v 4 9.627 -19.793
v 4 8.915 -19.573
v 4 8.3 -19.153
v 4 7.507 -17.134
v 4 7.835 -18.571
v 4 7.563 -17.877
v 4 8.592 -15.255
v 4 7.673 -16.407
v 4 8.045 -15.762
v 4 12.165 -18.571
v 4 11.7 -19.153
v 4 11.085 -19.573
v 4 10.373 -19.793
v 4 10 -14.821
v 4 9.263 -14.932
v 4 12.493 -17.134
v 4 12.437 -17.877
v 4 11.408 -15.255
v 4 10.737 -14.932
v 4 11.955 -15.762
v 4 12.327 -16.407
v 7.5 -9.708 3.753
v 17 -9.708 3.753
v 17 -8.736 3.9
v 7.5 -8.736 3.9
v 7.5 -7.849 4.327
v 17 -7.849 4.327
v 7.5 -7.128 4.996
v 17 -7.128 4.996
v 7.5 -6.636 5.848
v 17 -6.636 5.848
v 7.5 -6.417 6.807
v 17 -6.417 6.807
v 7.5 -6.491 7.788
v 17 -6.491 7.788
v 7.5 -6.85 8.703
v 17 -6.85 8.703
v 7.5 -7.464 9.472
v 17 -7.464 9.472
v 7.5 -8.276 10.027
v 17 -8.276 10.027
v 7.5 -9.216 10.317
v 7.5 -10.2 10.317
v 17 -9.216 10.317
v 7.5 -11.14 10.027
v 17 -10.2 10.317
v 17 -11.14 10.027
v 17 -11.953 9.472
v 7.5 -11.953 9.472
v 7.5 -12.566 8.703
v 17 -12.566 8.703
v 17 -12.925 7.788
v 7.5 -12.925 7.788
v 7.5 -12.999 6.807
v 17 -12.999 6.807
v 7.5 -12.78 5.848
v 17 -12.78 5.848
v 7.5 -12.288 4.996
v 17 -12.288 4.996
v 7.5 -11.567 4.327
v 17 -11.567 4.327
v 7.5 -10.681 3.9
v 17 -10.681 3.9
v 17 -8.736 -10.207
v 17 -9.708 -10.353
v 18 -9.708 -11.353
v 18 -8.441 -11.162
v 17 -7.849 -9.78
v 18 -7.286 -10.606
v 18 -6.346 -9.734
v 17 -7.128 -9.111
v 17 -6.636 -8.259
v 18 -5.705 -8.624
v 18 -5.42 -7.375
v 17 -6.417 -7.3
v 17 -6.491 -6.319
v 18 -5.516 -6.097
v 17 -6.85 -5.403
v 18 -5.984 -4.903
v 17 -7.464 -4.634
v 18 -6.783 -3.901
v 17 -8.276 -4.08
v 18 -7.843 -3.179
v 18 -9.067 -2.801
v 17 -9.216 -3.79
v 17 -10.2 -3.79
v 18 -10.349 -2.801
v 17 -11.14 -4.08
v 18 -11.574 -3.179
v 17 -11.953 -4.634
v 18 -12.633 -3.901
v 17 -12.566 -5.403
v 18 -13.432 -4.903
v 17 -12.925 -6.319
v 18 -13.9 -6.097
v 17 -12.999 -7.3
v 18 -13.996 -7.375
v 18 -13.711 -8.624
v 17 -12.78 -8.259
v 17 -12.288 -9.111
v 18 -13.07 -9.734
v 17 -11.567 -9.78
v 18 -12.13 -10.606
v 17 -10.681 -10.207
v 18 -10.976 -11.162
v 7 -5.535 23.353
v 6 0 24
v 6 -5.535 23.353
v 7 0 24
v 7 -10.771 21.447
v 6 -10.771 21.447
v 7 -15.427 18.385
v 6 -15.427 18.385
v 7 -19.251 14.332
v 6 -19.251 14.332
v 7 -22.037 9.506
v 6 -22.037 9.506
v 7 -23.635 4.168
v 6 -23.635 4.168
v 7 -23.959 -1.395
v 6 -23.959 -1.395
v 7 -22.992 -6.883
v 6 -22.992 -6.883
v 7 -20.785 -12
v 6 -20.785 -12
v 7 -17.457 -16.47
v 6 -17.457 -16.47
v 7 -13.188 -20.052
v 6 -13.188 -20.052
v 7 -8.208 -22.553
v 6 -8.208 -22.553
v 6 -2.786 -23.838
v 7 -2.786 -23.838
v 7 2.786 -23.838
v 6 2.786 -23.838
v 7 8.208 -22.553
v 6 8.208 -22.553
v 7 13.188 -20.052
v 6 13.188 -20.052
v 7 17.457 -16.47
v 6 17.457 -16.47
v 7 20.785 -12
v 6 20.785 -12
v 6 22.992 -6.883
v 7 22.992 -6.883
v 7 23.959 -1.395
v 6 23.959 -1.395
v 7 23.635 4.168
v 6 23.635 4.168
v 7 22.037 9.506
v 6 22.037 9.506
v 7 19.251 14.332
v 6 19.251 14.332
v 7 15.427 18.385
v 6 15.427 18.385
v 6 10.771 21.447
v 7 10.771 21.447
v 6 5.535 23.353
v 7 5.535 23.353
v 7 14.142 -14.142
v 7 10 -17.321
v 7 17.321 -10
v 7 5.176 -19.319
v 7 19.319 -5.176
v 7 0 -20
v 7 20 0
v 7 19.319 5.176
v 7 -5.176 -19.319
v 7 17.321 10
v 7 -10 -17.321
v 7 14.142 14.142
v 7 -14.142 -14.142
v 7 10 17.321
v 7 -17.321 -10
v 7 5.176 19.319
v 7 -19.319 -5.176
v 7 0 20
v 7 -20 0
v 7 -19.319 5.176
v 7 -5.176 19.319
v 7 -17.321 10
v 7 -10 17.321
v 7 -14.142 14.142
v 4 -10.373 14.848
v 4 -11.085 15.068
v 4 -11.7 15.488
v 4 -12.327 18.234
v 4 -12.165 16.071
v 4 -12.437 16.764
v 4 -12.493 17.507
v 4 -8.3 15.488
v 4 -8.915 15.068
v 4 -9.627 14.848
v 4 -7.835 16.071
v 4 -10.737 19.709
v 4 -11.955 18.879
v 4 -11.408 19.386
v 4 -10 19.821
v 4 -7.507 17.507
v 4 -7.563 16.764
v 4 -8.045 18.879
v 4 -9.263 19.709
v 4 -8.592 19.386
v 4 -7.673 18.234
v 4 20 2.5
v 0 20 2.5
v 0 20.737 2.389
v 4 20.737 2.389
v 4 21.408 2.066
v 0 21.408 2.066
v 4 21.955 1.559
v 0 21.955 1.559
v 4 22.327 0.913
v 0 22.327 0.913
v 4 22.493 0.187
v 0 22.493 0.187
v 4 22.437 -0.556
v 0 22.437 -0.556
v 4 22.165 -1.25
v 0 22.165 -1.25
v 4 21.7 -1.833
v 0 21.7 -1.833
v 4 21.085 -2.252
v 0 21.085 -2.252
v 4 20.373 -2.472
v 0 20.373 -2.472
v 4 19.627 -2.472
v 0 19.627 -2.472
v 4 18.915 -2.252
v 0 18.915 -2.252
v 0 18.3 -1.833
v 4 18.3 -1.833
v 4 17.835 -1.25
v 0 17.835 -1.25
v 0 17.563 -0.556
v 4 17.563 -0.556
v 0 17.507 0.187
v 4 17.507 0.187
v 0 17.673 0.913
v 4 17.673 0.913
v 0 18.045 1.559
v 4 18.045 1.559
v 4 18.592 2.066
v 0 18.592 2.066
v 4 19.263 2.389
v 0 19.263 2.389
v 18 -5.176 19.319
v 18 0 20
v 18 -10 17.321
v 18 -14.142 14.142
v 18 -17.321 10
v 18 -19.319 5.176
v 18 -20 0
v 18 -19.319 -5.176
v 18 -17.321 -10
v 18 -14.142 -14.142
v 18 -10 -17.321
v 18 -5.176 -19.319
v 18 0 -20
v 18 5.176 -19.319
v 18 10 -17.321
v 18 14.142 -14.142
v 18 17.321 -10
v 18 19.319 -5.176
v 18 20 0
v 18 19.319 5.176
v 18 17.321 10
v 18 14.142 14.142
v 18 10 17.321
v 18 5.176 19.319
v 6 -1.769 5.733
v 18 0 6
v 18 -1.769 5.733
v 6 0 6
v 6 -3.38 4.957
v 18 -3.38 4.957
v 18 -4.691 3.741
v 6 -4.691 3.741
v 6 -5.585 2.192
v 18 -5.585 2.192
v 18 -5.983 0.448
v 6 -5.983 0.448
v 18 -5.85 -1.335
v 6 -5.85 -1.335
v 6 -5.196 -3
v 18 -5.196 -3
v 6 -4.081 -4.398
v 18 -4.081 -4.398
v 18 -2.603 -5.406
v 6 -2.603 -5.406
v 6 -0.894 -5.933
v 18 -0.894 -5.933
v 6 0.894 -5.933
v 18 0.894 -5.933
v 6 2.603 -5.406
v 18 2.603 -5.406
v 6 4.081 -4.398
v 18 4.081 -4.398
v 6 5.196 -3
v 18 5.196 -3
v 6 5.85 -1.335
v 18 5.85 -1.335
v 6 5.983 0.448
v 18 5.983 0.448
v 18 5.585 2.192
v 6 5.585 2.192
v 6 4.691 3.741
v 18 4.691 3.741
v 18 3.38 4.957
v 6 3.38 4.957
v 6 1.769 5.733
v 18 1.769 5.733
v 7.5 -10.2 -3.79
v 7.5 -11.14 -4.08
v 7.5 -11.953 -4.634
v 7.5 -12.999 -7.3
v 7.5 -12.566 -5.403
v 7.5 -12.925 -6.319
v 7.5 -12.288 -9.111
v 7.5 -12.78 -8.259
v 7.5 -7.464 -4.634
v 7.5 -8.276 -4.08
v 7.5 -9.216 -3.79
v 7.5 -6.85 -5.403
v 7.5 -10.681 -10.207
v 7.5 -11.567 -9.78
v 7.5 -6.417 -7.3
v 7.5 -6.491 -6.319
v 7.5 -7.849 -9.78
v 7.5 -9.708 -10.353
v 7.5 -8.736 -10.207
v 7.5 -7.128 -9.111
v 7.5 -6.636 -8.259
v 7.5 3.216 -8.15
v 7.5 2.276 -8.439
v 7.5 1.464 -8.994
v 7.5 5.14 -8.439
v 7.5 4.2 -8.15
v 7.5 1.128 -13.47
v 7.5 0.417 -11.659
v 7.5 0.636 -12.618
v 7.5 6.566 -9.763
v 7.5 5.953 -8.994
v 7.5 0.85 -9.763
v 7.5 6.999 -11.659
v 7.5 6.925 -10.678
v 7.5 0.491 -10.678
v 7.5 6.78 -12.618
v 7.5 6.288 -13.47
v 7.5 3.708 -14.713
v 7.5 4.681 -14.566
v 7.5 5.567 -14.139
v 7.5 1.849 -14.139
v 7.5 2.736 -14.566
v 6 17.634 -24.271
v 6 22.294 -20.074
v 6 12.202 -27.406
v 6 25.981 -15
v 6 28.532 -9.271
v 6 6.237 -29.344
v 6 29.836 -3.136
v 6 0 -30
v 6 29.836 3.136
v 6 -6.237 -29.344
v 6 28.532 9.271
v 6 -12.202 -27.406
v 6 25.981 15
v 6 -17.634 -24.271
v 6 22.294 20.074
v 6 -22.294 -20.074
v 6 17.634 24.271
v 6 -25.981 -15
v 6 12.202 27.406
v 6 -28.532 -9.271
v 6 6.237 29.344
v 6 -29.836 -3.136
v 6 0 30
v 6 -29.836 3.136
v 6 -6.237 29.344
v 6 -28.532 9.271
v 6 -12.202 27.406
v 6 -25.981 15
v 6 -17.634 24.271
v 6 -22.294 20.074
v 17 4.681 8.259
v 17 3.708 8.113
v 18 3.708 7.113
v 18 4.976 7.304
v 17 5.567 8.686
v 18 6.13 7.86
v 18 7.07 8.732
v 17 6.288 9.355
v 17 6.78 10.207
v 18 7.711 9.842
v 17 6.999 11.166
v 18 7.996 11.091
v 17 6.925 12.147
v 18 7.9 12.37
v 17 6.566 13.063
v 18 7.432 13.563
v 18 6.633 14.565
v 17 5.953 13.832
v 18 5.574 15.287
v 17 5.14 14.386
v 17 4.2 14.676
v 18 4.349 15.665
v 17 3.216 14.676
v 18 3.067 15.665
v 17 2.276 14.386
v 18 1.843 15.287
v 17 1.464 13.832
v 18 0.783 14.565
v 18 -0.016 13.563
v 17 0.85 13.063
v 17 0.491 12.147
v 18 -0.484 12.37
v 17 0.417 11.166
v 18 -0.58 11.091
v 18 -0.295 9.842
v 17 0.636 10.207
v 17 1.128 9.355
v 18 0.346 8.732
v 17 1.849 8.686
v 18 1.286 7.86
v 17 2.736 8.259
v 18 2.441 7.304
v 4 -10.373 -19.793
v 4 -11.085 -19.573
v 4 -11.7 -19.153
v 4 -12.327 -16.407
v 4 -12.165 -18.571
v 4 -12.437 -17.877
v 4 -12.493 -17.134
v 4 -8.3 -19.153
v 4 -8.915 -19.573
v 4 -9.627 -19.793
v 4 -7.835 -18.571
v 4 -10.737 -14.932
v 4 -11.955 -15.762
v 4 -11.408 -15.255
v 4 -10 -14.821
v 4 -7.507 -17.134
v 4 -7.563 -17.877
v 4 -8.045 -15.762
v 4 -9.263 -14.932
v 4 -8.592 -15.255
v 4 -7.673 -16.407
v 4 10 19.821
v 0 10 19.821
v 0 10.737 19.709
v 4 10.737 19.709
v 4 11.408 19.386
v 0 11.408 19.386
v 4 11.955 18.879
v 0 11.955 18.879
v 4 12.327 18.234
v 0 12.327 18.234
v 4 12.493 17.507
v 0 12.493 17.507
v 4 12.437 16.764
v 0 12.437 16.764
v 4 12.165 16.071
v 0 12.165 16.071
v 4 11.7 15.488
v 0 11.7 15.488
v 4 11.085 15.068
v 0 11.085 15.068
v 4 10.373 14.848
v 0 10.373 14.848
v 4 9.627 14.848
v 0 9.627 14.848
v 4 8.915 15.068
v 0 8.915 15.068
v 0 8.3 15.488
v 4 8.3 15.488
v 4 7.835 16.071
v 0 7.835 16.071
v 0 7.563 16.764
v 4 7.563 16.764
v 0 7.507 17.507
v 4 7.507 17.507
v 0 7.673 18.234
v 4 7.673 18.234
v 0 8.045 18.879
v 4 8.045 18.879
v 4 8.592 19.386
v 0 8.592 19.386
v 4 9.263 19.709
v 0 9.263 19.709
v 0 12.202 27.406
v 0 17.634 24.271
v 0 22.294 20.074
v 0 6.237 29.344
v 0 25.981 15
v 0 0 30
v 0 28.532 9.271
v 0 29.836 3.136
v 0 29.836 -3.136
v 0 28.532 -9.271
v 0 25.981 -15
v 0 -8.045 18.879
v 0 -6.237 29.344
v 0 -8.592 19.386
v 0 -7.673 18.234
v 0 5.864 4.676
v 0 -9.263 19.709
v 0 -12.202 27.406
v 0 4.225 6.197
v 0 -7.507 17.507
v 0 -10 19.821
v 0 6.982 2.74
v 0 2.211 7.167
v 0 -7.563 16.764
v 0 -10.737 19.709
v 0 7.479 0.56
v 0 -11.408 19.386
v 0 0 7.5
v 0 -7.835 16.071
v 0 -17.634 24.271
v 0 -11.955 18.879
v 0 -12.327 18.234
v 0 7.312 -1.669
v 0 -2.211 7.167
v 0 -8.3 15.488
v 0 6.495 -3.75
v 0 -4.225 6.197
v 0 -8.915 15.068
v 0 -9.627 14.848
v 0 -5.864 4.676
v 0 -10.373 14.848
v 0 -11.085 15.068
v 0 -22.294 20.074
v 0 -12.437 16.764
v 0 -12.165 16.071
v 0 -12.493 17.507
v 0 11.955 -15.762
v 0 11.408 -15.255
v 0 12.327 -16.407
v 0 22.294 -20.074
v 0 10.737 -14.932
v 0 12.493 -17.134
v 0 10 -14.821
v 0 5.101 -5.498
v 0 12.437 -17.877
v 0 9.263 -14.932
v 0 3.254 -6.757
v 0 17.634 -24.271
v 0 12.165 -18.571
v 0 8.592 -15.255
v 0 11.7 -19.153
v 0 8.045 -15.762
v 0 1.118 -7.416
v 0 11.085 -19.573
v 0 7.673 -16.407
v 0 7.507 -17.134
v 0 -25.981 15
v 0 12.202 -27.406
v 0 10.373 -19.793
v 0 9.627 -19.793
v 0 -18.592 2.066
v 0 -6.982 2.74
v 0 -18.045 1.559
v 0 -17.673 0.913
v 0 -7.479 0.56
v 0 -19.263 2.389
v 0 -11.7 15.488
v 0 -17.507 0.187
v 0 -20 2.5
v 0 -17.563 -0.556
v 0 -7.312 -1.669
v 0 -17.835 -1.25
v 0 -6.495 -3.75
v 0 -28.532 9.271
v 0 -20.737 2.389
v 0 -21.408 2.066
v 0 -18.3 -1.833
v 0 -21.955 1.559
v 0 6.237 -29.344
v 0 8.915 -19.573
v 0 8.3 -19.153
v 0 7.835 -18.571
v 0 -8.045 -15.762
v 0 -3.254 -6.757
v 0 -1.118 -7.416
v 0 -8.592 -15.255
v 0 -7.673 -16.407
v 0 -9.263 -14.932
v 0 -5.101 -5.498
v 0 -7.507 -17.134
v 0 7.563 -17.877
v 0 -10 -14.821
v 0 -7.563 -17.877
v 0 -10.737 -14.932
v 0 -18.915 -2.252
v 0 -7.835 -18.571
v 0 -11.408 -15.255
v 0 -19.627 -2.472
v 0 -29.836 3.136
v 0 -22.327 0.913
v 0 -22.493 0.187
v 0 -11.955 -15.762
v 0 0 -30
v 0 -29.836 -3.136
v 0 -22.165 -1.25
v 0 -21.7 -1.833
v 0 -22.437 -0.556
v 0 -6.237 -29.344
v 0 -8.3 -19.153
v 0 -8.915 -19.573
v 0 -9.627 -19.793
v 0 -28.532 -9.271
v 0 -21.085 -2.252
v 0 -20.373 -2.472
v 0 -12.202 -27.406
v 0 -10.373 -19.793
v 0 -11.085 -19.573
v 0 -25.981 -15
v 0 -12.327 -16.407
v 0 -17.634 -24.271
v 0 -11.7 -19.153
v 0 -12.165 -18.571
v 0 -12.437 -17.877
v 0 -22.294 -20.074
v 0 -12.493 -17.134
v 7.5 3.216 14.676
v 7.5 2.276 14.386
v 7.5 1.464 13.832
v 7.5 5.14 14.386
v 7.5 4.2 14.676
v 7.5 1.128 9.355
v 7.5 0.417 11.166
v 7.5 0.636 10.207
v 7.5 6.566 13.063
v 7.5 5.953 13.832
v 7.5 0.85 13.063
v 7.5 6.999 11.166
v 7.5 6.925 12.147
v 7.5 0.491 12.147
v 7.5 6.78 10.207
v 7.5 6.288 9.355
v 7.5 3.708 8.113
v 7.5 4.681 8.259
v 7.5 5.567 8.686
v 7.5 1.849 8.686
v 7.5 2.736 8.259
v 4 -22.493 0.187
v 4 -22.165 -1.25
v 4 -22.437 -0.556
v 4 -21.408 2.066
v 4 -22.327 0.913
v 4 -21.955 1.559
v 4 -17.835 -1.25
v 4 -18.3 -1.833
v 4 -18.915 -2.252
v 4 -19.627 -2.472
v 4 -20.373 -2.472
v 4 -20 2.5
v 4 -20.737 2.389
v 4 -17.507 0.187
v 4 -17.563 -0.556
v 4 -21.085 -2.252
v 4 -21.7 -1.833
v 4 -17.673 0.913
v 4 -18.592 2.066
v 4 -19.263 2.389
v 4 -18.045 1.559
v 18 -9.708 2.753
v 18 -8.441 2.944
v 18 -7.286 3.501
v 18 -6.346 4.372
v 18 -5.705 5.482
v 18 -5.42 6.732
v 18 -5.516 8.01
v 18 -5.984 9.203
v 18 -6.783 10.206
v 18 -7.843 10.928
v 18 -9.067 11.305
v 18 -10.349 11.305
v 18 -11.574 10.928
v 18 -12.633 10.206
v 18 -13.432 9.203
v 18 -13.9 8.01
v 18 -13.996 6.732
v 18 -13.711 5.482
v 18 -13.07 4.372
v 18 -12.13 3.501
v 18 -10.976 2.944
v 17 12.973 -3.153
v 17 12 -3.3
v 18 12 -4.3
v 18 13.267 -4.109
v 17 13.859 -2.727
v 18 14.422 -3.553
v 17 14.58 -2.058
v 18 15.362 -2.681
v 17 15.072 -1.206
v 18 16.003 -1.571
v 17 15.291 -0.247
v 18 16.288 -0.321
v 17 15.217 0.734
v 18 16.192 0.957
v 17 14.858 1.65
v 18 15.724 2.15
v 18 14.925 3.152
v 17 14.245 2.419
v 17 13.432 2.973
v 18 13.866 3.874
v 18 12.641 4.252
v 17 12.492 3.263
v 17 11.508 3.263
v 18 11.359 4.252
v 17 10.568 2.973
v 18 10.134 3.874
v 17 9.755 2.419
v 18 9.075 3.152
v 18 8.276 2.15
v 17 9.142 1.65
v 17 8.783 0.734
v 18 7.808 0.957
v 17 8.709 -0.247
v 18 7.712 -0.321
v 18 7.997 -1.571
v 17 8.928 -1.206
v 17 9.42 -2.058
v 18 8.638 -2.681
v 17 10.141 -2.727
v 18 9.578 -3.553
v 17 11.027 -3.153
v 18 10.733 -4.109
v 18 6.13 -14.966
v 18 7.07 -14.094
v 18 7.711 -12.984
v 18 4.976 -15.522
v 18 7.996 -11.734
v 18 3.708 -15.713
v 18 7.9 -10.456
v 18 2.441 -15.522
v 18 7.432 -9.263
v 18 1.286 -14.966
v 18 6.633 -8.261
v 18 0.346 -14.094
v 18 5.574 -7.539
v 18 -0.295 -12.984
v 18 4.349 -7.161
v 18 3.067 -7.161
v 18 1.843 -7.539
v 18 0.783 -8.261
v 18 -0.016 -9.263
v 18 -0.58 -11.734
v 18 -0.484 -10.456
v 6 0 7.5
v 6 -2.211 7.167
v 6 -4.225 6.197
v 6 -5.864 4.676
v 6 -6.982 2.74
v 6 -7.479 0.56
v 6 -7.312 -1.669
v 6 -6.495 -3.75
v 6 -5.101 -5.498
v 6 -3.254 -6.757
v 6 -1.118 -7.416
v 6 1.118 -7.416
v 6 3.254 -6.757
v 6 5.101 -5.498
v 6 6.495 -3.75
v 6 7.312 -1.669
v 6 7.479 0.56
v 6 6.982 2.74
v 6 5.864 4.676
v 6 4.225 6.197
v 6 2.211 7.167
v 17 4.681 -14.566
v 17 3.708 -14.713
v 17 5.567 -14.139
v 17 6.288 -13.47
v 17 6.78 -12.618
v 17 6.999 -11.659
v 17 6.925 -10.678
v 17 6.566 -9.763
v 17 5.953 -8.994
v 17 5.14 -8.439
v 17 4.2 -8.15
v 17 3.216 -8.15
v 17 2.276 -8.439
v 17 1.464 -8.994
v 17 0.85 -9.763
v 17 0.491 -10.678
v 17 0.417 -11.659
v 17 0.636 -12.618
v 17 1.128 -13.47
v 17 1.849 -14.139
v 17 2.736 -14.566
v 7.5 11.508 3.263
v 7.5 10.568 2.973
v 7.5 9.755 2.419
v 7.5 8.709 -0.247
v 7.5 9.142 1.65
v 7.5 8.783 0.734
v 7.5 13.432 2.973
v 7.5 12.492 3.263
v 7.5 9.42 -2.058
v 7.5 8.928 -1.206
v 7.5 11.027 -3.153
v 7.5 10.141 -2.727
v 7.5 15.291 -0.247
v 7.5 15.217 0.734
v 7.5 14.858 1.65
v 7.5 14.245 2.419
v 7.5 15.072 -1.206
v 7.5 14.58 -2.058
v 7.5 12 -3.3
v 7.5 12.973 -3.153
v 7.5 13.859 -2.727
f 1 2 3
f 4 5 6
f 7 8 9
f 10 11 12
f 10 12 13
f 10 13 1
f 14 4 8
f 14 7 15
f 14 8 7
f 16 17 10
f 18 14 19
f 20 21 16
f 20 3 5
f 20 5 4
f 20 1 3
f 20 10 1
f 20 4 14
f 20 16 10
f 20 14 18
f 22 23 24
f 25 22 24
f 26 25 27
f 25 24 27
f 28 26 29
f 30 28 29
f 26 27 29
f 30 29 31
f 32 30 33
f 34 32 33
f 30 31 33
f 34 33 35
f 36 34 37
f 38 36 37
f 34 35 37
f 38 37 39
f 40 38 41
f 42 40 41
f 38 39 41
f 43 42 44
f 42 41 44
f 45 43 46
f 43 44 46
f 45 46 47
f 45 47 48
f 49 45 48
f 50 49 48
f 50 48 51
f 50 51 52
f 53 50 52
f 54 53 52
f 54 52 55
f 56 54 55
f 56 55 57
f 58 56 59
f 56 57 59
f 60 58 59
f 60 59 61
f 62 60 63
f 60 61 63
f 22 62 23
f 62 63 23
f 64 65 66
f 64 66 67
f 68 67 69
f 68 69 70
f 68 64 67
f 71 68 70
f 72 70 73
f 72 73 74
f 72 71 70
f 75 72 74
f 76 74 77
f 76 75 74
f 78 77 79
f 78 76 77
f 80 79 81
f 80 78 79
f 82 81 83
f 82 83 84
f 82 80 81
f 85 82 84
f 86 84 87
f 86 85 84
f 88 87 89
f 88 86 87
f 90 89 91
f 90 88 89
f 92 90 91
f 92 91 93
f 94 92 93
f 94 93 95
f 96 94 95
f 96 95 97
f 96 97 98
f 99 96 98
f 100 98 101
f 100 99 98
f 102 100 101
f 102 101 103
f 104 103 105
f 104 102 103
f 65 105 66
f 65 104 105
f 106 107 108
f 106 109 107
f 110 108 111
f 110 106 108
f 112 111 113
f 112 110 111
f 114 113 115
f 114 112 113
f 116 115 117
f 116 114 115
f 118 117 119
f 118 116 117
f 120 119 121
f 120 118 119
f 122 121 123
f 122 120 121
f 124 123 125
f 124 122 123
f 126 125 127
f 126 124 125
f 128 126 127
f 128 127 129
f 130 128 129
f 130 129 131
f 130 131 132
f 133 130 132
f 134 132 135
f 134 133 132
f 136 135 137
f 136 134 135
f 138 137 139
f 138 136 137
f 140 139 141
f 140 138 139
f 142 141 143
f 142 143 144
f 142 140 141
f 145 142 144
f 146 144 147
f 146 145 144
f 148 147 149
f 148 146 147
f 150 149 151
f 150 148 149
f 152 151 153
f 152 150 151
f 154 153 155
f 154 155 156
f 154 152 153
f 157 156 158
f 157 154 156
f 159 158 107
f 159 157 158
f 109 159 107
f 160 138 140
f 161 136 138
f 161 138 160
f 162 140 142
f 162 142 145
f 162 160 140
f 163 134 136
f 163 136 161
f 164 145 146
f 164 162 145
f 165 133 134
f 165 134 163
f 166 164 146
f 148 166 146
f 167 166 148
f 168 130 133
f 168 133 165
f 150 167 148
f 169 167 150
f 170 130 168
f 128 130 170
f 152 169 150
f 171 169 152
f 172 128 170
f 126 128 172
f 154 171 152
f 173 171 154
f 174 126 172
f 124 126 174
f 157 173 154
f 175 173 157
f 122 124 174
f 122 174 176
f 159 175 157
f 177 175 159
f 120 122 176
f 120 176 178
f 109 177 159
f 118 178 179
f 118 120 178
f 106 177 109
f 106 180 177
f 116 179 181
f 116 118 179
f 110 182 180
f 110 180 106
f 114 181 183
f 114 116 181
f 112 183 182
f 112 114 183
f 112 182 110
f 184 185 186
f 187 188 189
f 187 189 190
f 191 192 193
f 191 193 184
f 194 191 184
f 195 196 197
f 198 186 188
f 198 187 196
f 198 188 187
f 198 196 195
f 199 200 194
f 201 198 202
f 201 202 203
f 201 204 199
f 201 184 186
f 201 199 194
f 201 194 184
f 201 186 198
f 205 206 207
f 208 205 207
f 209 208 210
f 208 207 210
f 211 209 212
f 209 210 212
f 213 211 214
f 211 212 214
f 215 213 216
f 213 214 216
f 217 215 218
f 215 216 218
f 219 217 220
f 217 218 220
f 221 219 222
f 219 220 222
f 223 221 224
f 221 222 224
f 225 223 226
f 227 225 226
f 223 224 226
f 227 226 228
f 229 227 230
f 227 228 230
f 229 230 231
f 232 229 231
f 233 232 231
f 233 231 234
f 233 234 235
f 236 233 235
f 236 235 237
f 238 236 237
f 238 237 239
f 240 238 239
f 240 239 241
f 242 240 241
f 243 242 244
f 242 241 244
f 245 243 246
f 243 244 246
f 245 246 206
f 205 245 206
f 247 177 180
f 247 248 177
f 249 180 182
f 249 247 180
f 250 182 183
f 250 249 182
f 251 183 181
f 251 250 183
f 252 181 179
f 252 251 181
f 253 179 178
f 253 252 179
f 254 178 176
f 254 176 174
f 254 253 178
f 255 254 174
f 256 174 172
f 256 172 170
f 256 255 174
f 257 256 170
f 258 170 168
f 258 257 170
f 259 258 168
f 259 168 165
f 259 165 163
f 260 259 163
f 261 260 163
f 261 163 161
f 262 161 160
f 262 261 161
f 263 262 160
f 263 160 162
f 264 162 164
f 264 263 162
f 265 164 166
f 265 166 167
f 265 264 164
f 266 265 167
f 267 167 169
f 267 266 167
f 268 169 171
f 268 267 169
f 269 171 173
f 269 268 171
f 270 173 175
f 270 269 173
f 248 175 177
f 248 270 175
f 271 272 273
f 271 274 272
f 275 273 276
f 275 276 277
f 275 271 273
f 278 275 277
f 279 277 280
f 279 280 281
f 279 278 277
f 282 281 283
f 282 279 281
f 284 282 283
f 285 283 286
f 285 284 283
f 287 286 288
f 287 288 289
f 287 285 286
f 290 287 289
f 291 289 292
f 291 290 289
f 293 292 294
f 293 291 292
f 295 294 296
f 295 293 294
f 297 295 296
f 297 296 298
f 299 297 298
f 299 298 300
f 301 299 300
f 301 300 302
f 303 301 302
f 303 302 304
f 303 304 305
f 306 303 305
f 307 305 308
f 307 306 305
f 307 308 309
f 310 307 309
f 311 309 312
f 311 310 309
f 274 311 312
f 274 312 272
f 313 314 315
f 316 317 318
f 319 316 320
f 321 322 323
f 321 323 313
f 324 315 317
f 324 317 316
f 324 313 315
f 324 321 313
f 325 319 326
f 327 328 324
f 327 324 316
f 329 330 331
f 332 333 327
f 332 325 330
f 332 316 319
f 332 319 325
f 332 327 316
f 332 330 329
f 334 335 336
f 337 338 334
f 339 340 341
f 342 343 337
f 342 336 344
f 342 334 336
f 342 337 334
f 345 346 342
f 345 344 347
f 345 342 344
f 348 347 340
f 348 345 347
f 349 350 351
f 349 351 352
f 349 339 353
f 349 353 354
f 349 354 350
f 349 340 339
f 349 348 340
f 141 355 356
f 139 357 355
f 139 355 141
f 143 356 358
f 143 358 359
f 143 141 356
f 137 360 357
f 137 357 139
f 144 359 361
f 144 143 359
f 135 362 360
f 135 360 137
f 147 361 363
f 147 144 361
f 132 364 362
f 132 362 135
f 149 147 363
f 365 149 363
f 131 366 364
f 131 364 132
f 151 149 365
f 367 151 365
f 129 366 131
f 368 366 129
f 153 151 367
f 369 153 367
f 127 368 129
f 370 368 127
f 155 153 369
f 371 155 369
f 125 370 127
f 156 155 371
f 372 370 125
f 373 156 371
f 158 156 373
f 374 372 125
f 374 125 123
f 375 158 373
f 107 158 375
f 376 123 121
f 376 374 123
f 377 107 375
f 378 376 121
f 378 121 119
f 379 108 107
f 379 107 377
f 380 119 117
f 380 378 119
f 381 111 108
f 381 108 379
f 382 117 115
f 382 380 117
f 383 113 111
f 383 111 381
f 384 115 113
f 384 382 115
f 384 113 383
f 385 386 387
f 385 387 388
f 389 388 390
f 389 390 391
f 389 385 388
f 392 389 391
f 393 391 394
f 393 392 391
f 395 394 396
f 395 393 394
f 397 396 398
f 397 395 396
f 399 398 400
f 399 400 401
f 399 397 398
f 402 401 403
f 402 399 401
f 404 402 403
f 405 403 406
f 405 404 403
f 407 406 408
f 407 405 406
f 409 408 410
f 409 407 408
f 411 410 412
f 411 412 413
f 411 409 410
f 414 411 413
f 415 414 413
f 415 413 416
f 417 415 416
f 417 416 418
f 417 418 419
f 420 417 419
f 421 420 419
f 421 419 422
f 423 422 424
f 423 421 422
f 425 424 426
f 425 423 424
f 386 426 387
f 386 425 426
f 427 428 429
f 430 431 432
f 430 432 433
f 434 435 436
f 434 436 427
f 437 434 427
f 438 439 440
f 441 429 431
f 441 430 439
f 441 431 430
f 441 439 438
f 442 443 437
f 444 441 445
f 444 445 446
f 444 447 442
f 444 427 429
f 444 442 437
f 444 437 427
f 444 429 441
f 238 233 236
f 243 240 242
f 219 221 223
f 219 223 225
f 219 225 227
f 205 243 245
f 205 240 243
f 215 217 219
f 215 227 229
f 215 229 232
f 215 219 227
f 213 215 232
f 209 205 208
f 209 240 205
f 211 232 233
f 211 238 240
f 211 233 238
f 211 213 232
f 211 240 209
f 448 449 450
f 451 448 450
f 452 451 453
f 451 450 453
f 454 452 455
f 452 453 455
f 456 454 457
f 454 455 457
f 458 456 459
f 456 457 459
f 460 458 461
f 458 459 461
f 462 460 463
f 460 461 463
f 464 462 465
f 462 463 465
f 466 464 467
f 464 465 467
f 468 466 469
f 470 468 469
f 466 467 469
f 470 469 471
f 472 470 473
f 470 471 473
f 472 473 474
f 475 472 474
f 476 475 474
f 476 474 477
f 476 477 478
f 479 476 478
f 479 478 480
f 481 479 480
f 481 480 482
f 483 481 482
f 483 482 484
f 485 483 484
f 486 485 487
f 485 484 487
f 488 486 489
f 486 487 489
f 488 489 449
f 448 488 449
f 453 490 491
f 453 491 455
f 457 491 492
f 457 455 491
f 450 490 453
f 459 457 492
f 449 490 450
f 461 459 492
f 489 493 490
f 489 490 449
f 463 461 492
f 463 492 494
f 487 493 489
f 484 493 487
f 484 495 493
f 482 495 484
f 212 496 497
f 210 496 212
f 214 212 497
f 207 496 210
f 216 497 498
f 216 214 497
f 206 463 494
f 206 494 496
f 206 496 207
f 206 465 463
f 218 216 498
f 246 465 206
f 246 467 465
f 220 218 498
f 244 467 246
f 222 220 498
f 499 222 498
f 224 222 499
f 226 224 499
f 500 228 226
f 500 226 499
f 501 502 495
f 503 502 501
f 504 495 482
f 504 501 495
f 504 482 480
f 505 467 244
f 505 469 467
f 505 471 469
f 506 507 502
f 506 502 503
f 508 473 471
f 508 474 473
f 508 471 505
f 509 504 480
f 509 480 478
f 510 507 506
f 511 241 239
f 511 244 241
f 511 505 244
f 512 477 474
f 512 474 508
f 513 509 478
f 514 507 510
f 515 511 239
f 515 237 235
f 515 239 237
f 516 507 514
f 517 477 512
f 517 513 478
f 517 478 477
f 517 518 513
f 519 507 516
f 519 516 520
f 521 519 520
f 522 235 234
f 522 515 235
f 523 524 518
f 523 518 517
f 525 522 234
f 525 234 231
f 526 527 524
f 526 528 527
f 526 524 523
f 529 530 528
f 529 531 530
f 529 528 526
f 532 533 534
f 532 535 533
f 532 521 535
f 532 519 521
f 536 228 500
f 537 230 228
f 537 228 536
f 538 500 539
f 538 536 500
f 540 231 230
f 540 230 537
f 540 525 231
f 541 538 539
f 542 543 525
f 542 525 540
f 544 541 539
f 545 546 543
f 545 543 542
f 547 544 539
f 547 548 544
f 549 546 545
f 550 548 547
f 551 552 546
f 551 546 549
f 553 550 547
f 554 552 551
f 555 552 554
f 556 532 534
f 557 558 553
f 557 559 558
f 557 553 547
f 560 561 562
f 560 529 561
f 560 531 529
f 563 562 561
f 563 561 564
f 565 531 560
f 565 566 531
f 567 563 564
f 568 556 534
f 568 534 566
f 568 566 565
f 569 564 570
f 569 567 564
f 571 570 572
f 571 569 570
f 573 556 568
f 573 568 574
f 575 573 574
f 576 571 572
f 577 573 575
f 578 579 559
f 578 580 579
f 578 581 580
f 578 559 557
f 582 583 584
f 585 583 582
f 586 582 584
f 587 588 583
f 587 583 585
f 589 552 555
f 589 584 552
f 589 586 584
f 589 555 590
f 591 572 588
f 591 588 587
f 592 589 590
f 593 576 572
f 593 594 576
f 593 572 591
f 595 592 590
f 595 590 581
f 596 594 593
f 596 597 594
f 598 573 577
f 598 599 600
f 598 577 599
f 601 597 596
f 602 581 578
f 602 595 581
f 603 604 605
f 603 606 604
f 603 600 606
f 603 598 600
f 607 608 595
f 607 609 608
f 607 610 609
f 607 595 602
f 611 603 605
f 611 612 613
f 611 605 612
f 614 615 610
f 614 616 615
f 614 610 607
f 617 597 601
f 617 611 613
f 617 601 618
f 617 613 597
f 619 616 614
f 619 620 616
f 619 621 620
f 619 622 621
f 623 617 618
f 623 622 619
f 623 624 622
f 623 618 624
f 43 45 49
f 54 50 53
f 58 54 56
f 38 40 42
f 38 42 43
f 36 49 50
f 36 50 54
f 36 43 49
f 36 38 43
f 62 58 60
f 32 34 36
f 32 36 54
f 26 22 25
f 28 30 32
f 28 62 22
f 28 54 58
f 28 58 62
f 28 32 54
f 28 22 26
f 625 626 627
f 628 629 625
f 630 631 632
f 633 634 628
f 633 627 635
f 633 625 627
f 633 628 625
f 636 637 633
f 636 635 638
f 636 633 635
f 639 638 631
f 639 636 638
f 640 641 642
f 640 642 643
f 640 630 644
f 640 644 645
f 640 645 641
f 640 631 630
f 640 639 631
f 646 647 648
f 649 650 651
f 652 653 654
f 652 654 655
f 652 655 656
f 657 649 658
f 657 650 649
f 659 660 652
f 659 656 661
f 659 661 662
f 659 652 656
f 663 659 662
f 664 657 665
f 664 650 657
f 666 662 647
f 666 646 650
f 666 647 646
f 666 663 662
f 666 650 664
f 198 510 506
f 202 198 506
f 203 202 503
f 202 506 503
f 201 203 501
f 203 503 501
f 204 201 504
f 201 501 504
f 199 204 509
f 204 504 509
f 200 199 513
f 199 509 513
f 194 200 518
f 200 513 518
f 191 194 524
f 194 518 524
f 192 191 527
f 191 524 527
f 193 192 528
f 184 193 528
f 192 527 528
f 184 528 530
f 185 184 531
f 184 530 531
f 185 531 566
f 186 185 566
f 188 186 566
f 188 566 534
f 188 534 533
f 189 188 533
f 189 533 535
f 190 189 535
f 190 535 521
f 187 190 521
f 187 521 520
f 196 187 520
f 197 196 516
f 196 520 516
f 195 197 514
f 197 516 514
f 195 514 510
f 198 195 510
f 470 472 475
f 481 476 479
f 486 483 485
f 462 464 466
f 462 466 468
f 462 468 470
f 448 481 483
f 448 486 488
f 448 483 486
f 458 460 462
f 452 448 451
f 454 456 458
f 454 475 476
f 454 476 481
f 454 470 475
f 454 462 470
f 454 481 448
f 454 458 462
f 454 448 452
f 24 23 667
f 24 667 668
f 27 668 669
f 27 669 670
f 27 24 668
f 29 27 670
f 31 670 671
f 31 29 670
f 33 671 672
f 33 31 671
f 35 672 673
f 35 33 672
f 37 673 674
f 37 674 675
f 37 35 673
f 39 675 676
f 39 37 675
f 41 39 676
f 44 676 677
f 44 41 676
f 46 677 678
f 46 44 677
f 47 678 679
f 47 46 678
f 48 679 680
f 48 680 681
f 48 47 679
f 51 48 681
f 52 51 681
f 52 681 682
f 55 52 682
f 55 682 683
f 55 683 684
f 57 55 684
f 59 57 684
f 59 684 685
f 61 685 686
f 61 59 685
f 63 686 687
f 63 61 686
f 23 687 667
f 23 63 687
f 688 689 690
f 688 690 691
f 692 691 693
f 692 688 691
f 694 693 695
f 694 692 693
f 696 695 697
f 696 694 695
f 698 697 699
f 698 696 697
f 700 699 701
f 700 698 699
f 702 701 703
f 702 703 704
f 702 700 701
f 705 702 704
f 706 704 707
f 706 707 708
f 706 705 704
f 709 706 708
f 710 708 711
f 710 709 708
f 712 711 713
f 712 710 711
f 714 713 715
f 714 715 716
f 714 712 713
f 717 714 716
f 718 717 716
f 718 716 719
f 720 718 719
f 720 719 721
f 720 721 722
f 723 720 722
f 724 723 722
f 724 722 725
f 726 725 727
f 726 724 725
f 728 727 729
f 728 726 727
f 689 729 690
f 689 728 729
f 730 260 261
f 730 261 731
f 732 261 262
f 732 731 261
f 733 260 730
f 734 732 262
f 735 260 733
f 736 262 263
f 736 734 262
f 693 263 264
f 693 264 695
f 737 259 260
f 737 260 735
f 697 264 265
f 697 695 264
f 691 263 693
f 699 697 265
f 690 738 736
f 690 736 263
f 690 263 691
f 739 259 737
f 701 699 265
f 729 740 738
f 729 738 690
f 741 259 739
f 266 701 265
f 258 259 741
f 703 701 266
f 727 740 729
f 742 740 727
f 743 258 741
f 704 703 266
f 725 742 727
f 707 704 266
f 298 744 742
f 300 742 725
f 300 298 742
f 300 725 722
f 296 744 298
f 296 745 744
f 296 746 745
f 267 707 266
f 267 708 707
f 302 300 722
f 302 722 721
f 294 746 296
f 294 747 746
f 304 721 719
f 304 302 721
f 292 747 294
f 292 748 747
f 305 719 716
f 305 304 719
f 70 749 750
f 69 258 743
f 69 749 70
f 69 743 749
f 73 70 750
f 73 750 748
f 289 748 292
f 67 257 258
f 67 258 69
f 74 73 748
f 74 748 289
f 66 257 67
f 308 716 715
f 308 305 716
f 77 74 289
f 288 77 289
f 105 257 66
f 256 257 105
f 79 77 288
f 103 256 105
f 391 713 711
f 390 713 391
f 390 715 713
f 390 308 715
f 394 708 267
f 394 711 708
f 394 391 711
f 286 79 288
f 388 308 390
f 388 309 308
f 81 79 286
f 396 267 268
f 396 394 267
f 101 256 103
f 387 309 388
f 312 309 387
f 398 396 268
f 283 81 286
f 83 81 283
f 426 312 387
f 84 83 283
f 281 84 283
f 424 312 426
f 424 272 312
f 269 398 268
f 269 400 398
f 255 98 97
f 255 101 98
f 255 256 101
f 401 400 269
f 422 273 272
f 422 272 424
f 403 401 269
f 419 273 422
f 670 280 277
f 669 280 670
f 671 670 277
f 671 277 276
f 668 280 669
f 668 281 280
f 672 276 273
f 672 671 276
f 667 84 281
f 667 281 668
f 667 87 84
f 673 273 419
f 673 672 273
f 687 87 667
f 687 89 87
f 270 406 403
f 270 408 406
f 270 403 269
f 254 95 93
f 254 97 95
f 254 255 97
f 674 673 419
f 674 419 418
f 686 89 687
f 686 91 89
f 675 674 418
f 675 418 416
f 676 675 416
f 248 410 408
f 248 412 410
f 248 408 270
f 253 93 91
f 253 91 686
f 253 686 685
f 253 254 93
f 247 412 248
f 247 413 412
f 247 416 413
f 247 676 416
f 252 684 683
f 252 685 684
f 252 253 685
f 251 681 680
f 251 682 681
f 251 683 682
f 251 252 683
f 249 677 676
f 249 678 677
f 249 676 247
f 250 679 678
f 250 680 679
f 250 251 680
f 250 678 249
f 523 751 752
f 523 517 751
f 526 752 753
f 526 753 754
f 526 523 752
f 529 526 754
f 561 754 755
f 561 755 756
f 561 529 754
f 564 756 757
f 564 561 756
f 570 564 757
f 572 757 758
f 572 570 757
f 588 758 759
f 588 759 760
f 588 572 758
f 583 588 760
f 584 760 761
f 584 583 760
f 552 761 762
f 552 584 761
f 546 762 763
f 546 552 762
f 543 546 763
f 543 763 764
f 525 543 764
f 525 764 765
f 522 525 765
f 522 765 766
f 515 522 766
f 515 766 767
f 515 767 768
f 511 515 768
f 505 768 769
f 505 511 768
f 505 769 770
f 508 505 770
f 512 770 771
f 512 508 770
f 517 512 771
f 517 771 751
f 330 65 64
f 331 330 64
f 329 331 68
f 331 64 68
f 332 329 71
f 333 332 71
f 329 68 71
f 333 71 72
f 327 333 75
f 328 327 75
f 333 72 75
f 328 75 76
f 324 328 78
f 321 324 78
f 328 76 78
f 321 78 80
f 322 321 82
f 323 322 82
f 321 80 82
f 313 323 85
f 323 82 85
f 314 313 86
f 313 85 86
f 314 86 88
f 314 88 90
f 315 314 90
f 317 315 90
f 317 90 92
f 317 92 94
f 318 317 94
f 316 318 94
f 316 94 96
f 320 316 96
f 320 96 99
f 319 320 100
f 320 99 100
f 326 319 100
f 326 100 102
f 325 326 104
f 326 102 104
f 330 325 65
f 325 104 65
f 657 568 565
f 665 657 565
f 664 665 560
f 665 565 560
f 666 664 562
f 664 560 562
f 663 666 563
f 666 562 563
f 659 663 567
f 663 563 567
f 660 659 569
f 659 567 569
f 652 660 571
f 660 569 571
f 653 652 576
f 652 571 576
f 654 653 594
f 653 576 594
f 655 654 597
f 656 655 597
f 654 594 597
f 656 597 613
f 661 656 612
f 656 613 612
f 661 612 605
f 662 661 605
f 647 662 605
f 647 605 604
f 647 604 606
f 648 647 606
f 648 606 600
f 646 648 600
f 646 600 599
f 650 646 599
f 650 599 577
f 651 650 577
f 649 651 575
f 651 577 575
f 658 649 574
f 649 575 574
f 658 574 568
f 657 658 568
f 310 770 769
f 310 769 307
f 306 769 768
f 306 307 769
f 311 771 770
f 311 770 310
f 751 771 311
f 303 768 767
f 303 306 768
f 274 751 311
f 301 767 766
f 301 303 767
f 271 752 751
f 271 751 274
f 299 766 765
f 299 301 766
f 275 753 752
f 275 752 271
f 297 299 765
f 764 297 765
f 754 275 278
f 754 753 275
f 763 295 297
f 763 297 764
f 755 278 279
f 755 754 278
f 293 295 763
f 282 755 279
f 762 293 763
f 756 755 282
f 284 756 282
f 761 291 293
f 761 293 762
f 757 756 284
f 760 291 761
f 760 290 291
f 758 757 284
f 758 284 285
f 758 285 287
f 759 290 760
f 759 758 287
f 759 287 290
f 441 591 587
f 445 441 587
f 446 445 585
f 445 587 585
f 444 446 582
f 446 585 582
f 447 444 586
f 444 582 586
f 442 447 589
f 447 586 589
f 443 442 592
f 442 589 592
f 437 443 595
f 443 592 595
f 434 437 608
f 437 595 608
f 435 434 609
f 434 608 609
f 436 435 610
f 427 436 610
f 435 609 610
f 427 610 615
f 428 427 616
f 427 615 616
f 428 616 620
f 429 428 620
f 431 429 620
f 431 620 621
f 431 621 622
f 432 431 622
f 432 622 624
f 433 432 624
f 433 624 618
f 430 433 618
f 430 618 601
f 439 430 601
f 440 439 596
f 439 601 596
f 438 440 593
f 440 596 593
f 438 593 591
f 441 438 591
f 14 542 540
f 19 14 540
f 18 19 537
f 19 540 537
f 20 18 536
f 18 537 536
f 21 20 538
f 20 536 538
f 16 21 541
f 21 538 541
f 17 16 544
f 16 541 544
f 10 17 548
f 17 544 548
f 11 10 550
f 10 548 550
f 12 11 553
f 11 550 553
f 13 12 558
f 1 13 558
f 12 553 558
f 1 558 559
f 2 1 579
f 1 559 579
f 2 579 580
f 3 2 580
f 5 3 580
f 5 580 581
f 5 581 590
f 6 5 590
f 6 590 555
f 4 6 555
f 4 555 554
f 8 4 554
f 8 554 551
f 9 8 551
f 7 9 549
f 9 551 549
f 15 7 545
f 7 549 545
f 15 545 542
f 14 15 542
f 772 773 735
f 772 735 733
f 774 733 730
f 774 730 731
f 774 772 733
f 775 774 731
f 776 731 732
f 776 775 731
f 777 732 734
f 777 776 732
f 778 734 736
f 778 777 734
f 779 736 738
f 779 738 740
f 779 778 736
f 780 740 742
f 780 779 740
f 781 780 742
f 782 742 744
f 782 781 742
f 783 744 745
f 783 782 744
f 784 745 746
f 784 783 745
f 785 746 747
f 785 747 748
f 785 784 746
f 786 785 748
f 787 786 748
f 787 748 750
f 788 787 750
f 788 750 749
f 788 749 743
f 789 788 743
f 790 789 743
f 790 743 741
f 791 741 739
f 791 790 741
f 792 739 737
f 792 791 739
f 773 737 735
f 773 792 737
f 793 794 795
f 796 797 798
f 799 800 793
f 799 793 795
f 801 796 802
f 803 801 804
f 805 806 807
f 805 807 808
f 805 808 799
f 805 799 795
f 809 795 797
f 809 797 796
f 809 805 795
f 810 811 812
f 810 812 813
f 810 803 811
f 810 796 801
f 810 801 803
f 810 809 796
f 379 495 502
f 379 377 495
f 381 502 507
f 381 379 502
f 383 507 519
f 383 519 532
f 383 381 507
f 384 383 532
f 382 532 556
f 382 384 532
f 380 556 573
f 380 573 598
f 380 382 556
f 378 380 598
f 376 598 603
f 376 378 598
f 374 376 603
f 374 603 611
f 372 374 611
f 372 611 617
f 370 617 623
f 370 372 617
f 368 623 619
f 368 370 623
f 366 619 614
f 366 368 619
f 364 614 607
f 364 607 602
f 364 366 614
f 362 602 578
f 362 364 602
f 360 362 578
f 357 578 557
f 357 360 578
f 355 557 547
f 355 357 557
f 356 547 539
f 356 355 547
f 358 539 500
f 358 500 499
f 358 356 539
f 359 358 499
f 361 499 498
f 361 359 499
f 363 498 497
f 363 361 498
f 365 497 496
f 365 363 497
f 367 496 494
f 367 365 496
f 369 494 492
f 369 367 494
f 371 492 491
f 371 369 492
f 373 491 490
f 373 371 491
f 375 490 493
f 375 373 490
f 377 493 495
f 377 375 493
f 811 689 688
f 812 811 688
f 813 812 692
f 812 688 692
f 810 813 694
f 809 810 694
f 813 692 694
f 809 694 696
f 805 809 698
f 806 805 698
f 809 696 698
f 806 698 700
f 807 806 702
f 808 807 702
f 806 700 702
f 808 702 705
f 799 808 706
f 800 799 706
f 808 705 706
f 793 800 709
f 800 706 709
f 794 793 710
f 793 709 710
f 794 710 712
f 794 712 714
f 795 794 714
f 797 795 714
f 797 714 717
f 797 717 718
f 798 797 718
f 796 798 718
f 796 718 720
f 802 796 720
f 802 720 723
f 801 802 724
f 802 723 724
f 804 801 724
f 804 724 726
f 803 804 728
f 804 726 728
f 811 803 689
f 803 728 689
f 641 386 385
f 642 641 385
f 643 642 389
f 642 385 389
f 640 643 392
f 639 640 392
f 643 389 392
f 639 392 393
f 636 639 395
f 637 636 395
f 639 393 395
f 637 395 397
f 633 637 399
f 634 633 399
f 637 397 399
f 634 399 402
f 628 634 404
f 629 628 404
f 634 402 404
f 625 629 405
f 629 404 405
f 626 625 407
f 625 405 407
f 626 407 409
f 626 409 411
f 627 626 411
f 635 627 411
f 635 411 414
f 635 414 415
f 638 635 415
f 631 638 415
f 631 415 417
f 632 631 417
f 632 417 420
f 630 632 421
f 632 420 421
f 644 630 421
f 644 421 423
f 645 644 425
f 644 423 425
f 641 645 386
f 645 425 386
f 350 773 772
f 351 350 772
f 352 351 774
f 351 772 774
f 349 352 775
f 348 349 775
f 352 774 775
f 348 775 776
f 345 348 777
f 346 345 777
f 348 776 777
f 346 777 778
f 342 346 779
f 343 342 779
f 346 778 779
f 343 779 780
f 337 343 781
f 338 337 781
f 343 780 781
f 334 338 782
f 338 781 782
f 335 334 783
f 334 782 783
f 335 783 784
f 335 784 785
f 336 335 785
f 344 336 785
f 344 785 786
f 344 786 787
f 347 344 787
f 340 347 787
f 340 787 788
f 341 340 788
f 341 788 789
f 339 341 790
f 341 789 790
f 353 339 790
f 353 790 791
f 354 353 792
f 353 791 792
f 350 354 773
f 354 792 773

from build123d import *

# Parameters (mm, degrees)
SKETCH2_R          = 2.5
CUT_EXTRUDE1_DEPTH = 4
SKETCH3_R          = 3.3
CUT_EXTRUDE2_DEPTH = 10.5
CHAMFER1_SIZE      = 1


with BuildPart() as part:
    # Sketch1 → Revolve1 (revolve)
    with BuildSketch(Plane.XY, mode=Mode.PRIVATE) as revolve1_sk:
        Polygon((0, 30), (6, 30), (6, 24), (7, 24), (7, 20), (18, 20), (18, 6), (6, 6), (6, 7.5), (0, 7.5), align=None)
    revolve(revolve1_sk.sketch.rotate(Axis((0, 0, 0), (1, 0, 0)), 90), axis=Axis((0, 0, 0), (1, 0, 0)))

    # Sketch2 → Cut-Extrude1 (cut)
    with BuildSketch(Plane.ZY):
        with Locations((0, 20)):
            Circle(SKETCH2_R)
        with Locations((17.320508076, 10)):
            Circle(SKETCH2_R)
        with Locations((17.320508076, -10)):
            Circle(SKETCH2_R)
        with Locations((0, -20)):
            Circle(SKETCH2_R)
        with Locations((-17.320508076, -10)):
            Circle(SKETCH2_R)
        with Locations((-17.320508076, 10)):
            Circle(SKETCH2_R)
    extrude(amount=-CUT_EXTRUDE1_DEPTH, mode=Mode.SUBTRACT)

    # Sketch3 → Cut-Extrude2 (cut)
    with BuildSketch(Plane(origin=(18, 0, 0), x_dir=(0, 0, -1), z_dir=(1, 0, 0))):
        with Locations((0, 12)):
            Circle(SKETCH3_R)
        with Locations((11.412678196, 3.708203932)):
            Circle(SKETCH3_R)
        with Locations((7.053423028, -9.708203932)):
            Circle(SKETCH3_R)
        with Locations((-7.053423028, -9.708203932)):
            Circle(SKETCH3_R)
        with Locations((-11.412678196, 3.708203932)):
            Circle(SKETCH3_R)
    extrude(amount=-CUT_EXTRUDE2_DEPTH, mode=Mode.SUBTRACT)

    # Chamfer1
    chamfer1_edges = [part.edges().sort_by_distance(p)[0] for p in [
        (18, 12, 3.3),
        (18, 3.708203932, -8.112678196),
        (18, -9.708203932, -3.753423028),
        (18, -9.708203932, 10.353423028),
        (18, 3.708203932, 14.712678196),
    ]]
    chamfer(chamfer1_edges, length=CHAMFER1_SIZE)


solid = part.part
